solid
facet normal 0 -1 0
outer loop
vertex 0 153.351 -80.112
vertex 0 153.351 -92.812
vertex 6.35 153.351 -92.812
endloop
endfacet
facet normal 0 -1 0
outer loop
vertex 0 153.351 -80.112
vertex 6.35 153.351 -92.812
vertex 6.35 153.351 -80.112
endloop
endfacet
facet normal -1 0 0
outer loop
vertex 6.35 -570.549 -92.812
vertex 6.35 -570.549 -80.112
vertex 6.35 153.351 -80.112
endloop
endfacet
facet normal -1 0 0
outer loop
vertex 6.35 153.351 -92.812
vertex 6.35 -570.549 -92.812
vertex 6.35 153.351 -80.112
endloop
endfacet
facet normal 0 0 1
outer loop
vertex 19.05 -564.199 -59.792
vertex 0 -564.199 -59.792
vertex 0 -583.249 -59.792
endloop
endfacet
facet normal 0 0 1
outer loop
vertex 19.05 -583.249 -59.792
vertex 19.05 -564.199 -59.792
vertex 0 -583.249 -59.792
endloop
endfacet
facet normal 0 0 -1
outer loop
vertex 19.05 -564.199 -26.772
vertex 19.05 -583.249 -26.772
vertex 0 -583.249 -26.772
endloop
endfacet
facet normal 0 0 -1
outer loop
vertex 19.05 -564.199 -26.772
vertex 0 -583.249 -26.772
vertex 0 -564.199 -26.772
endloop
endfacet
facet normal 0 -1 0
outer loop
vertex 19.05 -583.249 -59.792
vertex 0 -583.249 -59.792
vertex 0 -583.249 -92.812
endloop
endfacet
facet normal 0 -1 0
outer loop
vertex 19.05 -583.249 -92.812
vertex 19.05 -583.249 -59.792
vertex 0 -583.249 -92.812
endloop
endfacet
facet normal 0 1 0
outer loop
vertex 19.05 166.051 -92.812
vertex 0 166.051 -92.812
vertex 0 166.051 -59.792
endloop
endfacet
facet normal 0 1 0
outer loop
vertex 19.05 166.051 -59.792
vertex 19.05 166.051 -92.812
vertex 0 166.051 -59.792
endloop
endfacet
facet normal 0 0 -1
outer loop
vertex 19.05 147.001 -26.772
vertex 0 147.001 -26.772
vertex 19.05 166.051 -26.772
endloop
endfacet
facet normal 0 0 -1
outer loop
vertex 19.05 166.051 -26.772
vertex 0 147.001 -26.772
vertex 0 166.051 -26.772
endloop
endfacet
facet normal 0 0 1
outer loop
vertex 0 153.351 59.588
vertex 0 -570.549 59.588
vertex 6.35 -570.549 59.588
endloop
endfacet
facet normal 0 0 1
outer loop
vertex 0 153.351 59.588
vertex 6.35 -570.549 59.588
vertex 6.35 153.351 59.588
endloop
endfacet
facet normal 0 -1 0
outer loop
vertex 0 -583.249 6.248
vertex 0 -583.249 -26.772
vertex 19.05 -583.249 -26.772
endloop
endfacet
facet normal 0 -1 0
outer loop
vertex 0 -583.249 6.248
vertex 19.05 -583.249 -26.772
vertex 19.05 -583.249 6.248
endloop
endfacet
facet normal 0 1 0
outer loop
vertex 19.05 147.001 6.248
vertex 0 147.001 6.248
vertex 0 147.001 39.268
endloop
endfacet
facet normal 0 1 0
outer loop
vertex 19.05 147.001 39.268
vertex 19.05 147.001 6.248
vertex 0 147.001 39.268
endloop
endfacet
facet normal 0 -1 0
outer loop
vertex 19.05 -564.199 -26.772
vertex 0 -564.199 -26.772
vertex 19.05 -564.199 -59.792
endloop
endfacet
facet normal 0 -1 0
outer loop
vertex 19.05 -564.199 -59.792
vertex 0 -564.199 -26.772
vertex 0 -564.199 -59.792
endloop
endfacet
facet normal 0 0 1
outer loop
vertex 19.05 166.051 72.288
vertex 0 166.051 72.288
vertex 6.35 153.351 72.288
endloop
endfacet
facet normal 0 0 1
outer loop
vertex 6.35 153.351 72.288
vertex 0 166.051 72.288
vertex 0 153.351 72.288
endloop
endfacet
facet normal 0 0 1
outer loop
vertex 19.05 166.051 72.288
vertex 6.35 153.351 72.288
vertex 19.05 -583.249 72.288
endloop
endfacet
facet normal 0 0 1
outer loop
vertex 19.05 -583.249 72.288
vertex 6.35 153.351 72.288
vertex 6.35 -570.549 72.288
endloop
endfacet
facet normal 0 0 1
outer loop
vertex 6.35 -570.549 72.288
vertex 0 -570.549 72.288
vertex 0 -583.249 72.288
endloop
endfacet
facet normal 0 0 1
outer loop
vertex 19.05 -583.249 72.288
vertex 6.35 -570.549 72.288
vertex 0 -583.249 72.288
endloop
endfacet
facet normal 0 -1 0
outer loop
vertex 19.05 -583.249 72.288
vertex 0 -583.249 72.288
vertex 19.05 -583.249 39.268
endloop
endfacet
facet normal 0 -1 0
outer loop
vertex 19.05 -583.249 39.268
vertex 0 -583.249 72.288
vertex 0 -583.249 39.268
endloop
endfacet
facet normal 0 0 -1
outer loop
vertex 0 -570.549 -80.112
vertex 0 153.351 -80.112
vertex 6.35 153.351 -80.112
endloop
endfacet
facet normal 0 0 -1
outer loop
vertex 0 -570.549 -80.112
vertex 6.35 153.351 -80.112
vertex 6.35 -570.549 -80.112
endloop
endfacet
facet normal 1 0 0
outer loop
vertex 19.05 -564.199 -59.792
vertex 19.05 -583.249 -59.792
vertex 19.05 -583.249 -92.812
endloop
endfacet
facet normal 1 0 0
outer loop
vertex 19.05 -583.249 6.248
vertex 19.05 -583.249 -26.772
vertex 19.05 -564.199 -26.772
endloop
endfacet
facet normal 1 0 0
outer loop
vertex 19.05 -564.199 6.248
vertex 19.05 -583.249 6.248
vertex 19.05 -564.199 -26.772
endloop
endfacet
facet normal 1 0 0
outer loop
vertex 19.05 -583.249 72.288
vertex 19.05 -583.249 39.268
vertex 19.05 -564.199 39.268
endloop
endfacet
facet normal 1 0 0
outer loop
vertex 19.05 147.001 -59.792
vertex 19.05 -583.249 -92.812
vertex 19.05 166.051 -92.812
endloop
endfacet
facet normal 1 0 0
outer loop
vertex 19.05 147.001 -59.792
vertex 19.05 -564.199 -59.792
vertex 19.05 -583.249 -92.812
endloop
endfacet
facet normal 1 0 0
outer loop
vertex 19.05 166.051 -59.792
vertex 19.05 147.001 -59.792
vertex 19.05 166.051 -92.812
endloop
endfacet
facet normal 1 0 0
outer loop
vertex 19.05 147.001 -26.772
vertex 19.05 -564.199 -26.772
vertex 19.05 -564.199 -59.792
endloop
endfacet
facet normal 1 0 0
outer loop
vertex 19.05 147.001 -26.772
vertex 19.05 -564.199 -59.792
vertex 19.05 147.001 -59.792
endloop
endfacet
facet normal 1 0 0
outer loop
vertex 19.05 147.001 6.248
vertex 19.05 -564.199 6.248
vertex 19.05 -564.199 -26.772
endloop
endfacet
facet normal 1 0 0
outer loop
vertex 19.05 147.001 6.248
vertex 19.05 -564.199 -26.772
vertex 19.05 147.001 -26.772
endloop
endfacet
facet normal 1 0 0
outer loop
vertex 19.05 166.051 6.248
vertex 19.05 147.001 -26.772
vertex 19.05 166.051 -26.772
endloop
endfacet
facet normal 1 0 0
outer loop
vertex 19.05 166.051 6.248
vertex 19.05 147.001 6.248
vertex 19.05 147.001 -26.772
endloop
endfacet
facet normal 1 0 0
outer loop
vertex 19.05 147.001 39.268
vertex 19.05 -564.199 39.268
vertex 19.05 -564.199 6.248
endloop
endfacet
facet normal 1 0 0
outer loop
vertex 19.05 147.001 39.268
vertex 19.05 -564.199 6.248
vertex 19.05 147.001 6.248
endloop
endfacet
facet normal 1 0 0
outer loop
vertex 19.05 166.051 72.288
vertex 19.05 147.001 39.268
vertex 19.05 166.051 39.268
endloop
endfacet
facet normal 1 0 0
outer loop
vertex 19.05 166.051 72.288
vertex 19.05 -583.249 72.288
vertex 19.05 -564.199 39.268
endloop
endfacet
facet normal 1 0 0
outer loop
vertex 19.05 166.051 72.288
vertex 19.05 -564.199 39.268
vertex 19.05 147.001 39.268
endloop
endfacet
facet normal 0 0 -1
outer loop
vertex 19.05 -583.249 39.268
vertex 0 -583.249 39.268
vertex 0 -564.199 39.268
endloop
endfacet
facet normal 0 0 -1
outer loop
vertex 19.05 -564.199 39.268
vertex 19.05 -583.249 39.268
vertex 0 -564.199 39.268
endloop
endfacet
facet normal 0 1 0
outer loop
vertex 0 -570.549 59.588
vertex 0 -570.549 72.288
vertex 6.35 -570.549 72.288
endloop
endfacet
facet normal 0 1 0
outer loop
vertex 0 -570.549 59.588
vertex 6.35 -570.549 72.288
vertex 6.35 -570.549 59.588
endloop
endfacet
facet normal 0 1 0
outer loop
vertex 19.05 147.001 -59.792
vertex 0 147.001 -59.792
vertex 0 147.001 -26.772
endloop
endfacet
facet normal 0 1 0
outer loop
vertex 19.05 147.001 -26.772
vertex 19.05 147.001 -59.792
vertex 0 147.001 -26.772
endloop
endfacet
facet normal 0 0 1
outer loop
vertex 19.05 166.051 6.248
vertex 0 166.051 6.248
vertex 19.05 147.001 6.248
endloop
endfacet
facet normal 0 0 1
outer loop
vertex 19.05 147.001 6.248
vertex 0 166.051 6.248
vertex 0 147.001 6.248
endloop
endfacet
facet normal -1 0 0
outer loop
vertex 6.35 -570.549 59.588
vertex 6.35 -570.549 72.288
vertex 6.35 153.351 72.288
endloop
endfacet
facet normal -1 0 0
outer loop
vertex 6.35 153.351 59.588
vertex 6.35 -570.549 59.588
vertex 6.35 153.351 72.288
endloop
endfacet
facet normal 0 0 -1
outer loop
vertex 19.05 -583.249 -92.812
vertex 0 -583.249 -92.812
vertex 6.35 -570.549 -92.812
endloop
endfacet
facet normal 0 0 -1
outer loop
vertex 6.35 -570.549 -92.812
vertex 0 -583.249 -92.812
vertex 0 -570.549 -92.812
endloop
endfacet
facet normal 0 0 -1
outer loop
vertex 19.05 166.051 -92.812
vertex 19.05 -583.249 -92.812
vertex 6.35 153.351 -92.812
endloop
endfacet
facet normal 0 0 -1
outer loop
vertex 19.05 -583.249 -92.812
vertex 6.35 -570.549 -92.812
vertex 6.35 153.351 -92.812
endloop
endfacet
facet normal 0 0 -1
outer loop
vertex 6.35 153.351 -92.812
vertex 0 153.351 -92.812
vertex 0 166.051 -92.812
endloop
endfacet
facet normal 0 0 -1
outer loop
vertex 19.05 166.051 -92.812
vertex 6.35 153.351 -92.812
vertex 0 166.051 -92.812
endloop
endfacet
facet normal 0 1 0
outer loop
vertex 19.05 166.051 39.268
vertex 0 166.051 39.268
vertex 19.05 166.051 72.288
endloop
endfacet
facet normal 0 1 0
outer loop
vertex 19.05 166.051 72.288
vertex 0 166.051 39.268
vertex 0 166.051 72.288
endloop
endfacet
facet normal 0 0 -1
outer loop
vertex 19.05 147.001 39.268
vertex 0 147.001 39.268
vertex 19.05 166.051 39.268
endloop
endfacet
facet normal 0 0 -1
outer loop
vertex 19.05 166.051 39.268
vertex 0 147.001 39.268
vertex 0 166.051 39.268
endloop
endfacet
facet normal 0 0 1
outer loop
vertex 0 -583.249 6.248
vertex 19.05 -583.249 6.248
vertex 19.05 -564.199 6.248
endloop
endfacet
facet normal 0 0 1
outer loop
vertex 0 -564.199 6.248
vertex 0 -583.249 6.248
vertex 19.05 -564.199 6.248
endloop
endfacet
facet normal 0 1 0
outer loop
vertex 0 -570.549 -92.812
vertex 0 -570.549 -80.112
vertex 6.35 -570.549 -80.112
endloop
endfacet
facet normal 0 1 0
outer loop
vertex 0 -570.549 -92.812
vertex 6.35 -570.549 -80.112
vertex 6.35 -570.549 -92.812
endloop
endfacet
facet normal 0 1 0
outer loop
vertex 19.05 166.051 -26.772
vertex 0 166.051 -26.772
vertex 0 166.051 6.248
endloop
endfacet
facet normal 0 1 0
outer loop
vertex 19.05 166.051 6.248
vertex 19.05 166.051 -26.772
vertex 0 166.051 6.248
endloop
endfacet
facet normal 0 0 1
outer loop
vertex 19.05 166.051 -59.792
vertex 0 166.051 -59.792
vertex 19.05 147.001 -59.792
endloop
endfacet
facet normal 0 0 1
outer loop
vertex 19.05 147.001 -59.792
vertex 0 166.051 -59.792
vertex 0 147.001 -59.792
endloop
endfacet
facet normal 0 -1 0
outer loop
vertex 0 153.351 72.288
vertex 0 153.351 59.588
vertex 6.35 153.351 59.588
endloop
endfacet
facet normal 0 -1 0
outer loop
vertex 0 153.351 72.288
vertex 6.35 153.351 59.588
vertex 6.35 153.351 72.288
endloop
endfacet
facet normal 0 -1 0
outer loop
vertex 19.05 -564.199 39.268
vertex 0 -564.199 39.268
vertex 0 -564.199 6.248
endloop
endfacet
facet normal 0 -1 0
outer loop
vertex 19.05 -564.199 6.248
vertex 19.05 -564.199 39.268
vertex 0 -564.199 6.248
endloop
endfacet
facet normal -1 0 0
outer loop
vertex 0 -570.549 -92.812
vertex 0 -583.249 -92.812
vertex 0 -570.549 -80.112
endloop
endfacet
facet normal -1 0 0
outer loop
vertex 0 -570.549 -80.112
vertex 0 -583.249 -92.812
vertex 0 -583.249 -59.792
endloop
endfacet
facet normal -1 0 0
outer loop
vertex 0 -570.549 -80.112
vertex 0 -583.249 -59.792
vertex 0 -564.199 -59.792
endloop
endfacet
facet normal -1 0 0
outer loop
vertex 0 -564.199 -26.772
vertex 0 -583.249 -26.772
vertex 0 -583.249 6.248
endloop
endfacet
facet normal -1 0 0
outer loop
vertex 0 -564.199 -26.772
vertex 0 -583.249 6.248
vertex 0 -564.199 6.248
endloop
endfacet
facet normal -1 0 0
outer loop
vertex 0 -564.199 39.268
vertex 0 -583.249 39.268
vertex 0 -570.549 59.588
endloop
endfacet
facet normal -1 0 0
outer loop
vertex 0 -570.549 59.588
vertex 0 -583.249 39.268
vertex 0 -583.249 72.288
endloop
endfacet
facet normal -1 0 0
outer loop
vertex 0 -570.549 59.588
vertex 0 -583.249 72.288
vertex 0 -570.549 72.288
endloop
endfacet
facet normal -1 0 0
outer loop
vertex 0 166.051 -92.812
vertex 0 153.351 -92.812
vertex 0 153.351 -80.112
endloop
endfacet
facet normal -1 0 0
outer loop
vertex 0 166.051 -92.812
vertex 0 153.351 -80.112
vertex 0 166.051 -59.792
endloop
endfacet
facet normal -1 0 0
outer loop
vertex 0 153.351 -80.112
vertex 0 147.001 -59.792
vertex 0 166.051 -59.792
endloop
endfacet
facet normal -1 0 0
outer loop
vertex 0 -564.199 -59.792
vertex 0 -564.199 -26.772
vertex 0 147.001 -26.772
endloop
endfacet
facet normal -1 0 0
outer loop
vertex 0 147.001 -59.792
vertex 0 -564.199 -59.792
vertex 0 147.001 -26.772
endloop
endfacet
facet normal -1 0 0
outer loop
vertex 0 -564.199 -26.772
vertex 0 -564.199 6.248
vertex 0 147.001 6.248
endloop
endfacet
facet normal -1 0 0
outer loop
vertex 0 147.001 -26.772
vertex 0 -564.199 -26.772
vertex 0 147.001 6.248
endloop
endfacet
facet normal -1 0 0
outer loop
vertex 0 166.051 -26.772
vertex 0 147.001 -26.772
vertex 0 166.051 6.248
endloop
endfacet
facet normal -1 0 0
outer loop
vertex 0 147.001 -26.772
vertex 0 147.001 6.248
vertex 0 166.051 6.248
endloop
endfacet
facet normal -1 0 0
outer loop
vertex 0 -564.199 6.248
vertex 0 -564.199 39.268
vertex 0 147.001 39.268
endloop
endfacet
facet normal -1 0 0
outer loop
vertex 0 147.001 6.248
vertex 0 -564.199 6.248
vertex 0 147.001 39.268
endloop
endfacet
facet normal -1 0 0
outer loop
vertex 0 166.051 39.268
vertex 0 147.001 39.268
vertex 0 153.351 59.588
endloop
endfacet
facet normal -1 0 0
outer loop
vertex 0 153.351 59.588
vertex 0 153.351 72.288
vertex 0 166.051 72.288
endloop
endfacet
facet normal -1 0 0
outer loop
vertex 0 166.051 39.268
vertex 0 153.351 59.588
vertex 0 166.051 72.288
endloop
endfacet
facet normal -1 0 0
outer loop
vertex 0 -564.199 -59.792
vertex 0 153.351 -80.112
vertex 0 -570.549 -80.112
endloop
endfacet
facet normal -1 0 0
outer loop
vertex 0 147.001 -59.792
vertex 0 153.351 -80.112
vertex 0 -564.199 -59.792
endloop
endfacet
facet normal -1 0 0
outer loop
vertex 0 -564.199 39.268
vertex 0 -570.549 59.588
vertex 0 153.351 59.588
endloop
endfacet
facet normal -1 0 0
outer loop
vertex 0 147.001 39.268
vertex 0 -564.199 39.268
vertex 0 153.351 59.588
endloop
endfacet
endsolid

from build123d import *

# Parameters (mm, degrees)
F0_W     = 19.05
F0_H     = 33.02
F1_DEPTH = 19.05
F2_DEPTH = 6.35
F3_DEPTH = 6.35


with BuildPart() as f1:
    # F0 (on Right) → F1 (new body)
    with BuildSketch(Plane.YZ):
        Polygon((-570.548746, 72.287804), (-583.248746, 72.287804), (-583.248746, 39.267804), (-564.198746, 39.267804), (-564.198746, 6.247804), (-564.198746, -26.772196), (-564.198746, -59.792196), (-564.198746, -80.112196), (147.001254, -80.112196), (147.001254, -59.792196), (147.001254, -26.772196), (147.001254, -10.262196), (147.001254, 6.247804), (147.001254, 39.267804), (147.001254, 59.587804), (-564.198746, 59.587804), (-570.548746, 59.587804), align=None)
        Polygon((-564.198746, 72.287804), (-570.548746, 72.287804), (-570.548746, 59.587804), (-564.198746, 59.587804), (147.001254, 59.587804), (153.351254, 59.587804), (153.351254, 72.287804), (147.001254, 72.287804), align=None)
        with Locations((-573.723746, -10.262196)):
            Rectangle(F0_W, F0_H)
        Polygon((166.051254, 72.287804), (153.351254, 72.287804), (153.351254, 59.587804), (147.001254, 59.587804), (147.001254, 39.267804), (166.051254, 39.267804), align=None)
        Polygon((-564.198746, -80.112196), (-564.198746, -59.792196), (-583.248746, -59.792196), (-583.248746, -92.812196), (-570.548746, -92.812196), (-570.548746, -80.112196), align=None)
        Polygon((166.051254, 6.247804), (147.001254, 6.247804), (147.001254, -10.262196), (147.001254, -26.772196), (166.051254, -26.772196), align=None)
        Polygon((147.001254, -80.112196), (-564.198746, -80.112196), (-570.548746, -80.112196), (-570.548746, -92.812196), (-564.198746, -92.812196), (147.001254, -92.812196), (153.351254, -92.812196), (153.351254, -80.112196), align=None)
        Polygon((147.001254, -59.792196), (147.001254, -80.112196), (153.351254, -80.112196), (153.351254, -92.812196), (166.051254, -92.812196), (166.051254, -59.792196), align=None)
    extrude(amount=F1_DEPTH)

    # F0 (on Right) → F2 (cut)
    with BuildSketch(Plane.YZ):
        Polygon((-564.198746, 72.287804), (-570.548746, 72.287804), (-570.548746, 59.587804), (-564.198746, 59.587804), (147.001254, 59.587804), (153.351254, 59.587804), (153.351254, 72.287804), (147.001254, 72.287804), align=None)
    extrude(amount=F2_DEPTH, mode=Mode.SUBTRACT)

    # F0 (on Right) → F3 (cut)
    with BuildSketch(Plane.YZ):
        Polygon((147.001254, -80.112196), (-564.198746, -80.112196), (-570.548746, -80.112196), (-570.548746, -92.812196), (-564.198746, -92.812196), (147.001254, -92.812196), (153.351254, -92.812196), (153.351254, -80.112196), align=None)
    extrude(amount=F3_DEPTH, mode=Mode.SUBTRACT)


solid = f1.part
